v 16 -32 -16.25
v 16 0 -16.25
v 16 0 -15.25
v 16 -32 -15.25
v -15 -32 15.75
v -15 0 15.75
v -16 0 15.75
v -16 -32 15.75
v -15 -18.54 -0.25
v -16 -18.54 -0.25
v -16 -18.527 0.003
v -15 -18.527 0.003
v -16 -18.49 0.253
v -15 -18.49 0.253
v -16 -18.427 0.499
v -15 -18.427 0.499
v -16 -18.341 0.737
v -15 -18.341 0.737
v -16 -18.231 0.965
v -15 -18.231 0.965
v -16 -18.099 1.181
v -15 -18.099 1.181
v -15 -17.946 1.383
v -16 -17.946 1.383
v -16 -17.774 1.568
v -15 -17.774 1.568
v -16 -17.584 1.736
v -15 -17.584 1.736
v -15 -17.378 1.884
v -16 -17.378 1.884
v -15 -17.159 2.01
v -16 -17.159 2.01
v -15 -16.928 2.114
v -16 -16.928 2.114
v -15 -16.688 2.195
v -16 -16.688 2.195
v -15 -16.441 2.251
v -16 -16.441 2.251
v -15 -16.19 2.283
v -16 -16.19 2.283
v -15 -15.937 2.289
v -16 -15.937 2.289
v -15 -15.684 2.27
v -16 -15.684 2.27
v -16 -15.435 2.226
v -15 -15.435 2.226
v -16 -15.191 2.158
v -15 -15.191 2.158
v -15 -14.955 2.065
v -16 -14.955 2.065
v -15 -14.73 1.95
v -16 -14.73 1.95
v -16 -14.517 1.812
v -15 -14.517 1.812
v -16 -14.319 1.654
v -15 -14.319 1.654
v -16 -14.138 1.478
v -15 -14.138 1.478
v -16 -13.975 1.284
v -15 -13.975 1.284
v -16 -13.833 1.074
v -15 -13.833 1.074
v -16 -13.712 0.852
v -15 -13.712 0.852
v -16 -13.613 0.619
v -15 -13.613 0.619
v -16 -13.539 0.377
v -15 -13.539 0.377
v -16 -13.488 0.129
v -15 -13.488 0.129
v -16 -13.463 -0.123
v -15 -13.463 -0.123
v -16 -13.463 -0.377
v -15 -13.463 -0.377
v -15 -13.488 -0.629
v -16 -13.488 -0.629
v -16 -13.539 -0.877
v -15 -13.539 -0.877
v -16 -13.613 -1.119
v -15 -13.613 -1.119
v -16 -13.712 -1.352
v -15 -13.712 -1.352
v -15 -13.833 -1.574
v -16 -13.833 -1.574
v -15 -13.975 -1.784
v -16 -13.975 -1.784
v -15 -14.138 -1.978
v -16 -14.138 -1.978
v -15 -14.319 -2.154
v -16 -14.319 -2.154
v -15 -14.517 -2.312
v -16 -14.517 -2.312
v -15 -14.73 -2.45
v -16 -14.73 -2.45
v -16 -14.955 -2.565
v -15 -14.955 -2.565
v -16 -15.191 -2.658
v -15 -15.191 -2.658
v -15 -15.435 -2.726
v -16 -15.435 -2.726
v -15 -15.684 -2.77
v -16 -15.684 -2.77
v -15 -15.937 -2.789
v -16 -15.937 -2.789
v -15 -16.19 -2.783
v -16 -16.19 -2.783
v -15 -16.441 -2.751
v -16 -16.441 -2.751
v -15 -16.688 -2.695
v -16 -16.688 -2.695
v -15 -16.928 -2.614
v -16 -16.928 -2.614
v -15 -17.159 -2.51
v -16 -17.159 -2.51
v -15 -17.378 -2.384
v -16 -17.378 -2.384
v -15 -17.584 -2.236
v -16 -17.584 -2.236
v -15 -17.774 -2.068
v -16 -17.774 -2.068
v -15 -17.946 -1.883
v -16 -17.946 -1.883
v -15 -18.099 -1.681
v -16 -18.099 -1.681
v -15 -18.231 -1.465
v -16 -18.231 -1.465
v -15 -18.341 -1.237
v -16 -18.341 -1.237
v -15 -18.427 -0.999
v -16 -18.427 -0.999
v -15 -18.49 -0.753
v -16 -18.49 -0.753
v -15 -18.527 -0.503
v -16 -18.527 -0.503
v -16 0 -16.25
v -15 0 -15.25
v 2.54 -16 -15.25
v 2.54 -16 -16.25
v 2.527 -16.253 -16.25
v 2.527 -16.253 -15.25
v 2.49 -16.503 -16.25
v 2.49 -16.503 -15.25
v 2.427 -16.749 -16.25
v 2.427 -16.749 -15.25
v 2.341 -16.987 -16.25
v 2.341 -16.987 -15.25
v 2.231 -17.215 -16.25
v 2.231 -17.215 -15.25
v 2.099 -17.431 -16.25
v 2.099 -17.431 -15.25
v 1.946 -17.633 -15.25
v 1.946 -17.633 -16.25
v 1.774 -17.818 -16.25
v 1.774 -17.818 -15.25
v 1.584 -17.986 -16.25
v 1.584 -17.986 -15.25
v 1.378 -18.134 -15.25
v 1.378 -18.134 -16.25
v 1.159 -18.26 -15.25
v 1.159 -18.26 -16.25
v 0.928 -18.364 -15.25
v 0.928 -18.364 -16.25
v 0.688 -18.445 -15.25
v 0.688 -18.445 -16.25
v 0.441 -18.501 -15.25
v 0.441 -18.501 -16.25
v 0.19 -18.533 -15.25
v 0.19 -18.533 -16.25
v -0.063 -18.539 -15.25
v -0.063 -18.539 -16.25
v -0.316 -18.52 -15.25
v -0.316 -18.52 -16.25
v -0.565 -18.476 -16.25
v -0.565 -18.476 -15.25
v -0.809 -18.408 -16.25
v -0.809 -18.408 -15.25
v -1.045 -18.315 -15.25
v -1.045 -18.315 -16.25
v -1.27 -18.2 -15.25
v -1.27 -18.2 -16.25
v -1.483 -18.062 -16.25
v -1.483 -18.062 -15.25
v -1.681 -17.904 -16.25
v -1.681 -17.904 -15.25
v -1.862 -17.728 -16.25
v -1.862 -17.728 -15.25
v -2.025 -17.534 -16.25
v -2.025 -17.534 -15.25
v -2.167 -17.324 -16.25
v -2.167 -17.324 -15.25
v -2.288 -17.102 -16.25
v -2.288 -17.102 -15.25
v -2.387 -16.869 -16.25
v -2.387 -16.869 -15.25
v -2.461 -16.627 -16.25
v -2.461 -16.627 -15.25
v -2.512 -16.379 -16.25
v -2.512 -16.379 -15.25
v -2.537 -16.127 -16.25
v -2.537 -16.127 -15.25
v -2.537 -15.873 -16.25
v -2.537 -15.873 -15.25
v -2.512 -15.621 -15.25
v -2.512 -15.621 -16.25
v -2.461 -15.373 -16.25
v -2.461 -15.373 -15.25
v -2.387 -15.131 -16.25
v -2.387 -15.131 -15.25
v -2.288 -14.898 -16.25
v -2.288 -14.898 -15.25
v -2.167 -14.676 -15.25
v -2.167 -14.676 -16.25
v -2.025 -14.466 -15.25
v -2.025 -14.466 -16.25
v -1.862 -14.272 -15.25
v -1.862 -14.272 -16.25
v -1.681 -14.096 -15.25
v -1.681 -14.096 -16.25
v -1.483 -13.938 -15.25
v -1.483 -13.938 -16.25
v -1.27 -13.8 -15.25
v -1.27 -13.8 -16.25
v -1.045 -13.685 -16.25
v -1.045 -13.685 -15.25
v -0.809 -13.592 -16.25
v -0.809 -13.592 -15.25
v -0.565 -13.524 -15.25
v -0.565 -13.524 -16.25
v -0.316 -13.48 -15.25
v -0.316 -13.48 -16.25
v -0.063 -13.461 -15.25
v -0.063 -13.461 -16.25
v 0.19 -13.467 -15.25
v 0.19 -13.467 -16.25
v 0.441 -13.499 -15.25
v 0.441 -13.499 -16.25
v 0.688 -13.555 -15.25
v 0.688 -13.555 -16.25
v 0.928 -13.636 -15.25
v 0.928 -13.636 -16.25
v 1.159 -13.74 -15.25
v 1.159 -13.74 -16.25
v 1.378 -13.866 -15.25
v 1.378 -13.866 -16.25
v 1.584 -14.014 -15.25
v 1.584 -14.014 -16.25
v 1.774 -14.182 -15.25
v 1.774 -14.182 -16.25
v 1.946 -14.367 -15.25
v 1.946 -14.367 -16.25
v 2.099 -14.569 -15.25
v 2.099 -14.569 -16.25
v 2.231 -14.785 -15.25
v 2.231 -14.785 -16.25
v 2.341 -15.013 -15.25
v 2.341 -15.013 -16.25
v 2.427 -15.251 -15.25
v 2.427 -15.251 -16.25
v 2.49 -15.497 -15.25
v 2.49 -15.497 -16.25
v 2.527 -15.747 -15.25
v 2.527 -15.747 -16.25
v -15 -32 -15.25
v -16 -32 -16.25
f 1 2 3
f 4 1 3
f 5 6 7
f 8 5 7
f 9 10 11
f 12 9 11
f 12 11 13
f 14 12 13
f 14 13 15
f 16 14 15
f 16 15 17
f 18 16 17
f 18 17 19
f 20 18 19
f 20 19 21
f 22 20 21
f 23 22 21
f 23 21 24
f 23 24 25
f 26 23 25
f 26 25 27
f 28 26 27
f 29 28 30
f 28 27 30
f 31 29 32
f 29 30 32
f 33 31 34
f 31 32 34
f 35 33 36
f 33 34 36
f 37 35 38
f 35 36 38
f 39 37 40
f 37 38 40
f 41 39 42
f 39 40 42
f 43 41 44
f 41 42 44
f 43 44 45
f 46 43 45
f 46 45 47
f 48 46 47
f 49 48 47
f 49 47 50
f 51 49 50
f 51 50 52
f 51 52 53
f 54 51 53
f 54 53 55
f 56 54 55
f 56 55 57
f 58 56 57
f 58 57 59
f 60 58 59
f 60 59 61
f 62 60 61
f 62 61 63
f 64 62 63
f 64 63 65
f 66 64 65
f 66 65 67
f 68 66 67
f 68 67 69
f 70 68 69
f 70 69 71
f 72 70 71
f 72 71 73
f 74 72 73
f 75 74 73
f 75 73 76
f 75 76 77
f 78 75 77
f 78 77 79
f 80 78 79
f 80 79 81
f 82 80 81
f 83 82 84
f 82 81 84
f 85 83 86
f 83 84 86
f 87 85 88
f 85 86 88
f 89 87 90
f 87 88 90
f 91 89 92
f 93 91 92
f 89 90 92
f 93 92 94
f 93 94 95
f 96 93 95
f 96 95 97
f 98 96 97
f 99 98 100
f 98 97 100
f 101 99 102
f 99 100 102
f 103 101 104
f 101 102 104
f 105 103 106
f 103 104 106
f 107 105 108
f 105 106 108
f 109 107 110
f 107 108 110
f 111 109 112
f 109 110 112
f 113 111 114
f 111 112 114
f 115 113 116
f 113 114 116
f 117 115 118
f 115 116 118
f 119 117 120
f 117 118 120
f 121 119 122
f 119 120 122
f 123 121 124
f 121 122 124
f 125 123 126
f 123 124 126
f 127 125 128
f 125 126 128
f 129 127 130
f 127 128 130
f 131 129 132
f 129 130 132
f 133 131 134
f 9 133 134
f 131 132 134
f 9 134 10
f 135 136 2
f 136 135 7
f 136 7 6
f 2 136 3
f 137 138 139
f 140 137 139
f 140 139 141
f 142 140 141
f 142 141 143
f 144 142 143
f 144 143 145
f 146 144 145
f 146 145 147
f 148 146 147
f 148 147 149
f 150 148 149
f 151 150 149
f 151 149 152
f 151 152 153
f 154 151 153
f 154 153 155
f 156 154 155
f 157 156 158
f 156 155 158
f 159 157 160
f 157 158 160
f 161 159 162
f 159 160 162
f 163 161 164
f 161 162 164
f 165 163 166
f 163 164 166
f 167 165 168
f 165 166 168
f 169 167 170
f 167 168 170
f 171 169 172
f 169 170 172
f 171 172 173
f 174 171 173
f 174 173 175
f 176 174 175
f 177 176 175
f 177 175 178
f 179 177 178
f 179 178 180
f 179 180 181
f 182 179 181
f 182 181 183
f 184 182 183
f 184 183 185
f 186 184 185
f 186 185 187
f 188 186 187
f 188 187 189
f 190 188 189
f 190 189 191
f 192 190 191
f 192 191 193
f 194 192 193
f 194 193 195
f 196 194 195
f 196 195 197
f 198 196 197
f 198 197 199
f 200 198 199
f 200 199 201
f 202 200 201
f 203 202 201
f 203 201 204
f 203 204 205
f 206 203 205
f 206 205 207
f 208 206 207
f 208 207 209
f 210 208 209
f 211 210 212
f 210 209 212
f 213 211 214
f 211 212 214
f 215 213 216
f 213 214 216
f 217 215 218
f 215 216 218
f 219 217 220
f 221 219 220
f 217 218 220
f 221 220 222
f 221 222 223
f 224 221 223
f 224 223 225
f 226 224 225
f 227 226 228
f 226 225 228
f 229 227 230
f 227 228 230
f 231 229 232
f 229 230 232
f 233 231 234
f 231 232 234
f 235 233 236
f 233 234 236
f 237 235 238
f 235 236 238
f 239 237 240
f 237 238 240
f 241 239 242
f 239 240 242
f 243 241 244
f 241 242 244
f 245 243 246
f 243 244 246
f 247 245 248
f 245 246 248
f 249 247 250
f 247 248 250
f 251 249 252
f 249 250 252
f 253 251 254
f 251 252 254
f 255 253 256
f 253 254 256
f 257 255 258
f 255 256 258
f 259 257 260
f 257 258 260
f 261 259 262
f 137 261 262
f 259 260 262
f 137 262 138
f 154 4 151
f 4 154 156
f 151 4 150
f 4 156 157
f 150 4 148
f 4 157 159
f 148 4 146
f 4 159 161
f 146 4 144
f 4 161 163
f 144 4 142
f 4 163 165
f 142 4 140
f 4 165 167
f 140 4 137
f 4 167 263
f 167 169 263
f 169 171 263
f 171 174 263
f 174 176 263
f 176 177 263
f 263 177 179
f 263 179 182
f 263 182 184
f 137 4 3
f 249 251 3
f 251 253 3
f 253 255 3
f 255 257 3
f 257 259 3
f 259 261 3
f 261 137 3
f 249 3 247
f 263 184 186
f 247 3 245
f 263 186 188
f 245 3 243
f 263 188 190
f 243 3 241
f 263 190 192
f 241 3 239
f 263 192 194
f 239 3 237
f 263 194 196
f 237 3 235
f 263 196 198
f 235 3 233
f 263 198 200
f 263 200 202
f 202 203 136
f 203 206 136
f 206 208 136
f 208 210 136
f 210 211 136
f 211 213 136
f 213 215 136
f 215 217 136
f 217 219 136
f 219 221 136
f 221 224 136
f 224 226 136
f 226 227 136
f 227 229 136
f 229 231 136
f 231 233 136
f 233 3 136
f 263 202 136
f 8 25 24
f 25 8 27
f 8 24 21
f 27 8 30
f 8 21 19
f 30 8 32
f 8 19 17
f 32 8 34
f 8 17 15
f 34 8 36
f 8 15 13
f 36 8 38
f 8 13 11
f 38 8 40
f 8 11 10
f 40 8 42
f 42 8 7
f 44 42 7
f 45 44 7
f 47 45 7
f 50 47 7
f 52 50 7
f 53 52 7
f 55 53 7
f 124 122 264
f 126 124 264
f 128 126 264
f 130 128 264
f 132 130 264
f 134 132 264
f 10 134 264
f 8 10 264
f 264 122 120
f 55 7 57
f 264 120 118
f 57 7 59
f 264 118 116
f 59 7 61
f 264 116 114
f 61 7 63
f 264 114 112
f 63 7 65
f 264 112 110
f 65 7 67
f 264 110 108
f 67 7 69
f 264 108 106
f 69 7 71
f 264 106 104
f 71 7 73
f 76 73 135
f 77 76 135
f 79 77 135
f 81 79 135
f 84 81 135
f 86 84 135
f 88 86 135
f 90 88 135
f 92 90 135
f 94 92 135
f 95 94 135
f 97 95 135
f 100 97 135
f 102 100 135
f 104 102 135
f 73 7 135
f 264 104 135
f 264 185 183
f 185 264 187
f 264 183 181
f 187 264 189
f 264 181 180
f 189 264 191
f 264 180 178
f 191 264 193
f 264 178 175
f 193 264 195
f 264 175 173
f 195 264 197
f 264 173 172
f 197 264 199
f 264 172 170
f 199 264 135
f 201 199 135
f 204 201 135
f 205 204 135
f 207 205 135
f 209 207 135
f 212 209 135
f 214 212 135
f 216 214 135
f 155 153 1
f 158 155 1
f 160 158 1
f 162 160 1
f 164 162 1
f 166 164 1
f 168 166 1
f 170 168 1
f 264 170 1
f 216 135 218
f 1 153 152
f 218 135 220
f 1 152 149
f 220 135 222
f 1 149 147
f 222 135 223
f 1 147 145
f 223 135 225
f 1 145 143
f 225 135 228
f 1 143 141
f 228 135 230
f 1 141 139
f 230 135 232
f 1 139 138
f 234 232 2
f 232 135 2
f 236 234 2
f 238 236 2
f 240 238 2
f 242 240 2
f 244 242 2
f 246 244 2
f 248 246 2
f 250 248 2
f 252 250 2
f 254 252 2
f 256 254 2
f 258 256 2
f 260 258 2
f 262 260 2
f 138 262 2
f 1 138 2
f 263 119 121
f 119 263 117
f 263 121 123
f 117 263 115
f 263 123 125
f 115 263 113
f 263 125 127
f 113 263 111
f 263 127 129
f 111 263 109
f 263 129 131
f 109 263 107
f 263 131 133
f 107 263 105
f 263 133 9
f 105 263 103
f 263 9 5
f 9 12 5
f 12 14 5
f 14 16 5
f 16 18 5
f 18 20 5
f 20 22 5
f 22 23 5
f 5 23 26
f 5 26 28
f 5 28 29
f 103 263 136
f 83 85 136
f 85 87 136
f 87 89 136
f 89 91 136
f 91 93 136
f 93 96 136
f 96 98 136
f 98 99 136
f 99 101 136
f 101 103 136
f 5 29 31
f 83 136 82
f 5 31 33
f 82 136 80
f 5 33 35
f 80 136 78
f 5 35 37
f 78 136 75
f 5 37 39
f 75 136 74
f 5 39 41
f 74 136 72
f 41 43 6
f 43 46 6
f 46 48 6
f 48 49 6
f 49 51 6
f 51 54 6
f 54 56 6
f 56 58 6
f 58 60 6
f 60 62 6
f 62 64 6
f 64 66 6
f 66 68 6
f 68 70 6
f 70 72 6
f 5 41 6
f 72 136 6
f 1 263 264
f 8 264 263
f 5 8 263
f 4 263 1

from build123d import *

# Parameters (mm, degrees)
F1_DEPTH = 32
F2_R     = 2.54
F3_DEPTH = 25.4
F4_R     = 2.54
F5_DEPTH = 25.4


with BuildPart() as f1:
    # F0 (on Front) → F1 (new body)
    with BuildSketch(Plane.XZ):
        Polygon((-15, 15.75), (-16, 15.75), (-16, -16.25), (16, -16.25), (16, -15.25), (-15, -15.25), align=None)
    extrude(amount=F1_DEPTH)

    # F2 (on face) → F3 (cut)
    with BuildSketch(Plane(origin=(-16, 0, 0), x_dir=(0, -1, 0), z_dir=(-1, 0, 0))):
        with Locations((16, -0.25)):
            Circle(F2_R)
    extrude(amount=-F3_DEPTH, mode=Mode.SUBTRACT)

    # F4 (on face) → F5 (cut)
    with BuildSketch(Plane(origin=(0, 0, -16.25), x_dir=(1, 0, 0), z_dir=(0, 0, -1))):
        with Locations((0, 16)):
            Circle(F4_R)
    extrude(amount=-F5_DEPTH, mode=Mode.SUBTRACT)


solid = f1.part
